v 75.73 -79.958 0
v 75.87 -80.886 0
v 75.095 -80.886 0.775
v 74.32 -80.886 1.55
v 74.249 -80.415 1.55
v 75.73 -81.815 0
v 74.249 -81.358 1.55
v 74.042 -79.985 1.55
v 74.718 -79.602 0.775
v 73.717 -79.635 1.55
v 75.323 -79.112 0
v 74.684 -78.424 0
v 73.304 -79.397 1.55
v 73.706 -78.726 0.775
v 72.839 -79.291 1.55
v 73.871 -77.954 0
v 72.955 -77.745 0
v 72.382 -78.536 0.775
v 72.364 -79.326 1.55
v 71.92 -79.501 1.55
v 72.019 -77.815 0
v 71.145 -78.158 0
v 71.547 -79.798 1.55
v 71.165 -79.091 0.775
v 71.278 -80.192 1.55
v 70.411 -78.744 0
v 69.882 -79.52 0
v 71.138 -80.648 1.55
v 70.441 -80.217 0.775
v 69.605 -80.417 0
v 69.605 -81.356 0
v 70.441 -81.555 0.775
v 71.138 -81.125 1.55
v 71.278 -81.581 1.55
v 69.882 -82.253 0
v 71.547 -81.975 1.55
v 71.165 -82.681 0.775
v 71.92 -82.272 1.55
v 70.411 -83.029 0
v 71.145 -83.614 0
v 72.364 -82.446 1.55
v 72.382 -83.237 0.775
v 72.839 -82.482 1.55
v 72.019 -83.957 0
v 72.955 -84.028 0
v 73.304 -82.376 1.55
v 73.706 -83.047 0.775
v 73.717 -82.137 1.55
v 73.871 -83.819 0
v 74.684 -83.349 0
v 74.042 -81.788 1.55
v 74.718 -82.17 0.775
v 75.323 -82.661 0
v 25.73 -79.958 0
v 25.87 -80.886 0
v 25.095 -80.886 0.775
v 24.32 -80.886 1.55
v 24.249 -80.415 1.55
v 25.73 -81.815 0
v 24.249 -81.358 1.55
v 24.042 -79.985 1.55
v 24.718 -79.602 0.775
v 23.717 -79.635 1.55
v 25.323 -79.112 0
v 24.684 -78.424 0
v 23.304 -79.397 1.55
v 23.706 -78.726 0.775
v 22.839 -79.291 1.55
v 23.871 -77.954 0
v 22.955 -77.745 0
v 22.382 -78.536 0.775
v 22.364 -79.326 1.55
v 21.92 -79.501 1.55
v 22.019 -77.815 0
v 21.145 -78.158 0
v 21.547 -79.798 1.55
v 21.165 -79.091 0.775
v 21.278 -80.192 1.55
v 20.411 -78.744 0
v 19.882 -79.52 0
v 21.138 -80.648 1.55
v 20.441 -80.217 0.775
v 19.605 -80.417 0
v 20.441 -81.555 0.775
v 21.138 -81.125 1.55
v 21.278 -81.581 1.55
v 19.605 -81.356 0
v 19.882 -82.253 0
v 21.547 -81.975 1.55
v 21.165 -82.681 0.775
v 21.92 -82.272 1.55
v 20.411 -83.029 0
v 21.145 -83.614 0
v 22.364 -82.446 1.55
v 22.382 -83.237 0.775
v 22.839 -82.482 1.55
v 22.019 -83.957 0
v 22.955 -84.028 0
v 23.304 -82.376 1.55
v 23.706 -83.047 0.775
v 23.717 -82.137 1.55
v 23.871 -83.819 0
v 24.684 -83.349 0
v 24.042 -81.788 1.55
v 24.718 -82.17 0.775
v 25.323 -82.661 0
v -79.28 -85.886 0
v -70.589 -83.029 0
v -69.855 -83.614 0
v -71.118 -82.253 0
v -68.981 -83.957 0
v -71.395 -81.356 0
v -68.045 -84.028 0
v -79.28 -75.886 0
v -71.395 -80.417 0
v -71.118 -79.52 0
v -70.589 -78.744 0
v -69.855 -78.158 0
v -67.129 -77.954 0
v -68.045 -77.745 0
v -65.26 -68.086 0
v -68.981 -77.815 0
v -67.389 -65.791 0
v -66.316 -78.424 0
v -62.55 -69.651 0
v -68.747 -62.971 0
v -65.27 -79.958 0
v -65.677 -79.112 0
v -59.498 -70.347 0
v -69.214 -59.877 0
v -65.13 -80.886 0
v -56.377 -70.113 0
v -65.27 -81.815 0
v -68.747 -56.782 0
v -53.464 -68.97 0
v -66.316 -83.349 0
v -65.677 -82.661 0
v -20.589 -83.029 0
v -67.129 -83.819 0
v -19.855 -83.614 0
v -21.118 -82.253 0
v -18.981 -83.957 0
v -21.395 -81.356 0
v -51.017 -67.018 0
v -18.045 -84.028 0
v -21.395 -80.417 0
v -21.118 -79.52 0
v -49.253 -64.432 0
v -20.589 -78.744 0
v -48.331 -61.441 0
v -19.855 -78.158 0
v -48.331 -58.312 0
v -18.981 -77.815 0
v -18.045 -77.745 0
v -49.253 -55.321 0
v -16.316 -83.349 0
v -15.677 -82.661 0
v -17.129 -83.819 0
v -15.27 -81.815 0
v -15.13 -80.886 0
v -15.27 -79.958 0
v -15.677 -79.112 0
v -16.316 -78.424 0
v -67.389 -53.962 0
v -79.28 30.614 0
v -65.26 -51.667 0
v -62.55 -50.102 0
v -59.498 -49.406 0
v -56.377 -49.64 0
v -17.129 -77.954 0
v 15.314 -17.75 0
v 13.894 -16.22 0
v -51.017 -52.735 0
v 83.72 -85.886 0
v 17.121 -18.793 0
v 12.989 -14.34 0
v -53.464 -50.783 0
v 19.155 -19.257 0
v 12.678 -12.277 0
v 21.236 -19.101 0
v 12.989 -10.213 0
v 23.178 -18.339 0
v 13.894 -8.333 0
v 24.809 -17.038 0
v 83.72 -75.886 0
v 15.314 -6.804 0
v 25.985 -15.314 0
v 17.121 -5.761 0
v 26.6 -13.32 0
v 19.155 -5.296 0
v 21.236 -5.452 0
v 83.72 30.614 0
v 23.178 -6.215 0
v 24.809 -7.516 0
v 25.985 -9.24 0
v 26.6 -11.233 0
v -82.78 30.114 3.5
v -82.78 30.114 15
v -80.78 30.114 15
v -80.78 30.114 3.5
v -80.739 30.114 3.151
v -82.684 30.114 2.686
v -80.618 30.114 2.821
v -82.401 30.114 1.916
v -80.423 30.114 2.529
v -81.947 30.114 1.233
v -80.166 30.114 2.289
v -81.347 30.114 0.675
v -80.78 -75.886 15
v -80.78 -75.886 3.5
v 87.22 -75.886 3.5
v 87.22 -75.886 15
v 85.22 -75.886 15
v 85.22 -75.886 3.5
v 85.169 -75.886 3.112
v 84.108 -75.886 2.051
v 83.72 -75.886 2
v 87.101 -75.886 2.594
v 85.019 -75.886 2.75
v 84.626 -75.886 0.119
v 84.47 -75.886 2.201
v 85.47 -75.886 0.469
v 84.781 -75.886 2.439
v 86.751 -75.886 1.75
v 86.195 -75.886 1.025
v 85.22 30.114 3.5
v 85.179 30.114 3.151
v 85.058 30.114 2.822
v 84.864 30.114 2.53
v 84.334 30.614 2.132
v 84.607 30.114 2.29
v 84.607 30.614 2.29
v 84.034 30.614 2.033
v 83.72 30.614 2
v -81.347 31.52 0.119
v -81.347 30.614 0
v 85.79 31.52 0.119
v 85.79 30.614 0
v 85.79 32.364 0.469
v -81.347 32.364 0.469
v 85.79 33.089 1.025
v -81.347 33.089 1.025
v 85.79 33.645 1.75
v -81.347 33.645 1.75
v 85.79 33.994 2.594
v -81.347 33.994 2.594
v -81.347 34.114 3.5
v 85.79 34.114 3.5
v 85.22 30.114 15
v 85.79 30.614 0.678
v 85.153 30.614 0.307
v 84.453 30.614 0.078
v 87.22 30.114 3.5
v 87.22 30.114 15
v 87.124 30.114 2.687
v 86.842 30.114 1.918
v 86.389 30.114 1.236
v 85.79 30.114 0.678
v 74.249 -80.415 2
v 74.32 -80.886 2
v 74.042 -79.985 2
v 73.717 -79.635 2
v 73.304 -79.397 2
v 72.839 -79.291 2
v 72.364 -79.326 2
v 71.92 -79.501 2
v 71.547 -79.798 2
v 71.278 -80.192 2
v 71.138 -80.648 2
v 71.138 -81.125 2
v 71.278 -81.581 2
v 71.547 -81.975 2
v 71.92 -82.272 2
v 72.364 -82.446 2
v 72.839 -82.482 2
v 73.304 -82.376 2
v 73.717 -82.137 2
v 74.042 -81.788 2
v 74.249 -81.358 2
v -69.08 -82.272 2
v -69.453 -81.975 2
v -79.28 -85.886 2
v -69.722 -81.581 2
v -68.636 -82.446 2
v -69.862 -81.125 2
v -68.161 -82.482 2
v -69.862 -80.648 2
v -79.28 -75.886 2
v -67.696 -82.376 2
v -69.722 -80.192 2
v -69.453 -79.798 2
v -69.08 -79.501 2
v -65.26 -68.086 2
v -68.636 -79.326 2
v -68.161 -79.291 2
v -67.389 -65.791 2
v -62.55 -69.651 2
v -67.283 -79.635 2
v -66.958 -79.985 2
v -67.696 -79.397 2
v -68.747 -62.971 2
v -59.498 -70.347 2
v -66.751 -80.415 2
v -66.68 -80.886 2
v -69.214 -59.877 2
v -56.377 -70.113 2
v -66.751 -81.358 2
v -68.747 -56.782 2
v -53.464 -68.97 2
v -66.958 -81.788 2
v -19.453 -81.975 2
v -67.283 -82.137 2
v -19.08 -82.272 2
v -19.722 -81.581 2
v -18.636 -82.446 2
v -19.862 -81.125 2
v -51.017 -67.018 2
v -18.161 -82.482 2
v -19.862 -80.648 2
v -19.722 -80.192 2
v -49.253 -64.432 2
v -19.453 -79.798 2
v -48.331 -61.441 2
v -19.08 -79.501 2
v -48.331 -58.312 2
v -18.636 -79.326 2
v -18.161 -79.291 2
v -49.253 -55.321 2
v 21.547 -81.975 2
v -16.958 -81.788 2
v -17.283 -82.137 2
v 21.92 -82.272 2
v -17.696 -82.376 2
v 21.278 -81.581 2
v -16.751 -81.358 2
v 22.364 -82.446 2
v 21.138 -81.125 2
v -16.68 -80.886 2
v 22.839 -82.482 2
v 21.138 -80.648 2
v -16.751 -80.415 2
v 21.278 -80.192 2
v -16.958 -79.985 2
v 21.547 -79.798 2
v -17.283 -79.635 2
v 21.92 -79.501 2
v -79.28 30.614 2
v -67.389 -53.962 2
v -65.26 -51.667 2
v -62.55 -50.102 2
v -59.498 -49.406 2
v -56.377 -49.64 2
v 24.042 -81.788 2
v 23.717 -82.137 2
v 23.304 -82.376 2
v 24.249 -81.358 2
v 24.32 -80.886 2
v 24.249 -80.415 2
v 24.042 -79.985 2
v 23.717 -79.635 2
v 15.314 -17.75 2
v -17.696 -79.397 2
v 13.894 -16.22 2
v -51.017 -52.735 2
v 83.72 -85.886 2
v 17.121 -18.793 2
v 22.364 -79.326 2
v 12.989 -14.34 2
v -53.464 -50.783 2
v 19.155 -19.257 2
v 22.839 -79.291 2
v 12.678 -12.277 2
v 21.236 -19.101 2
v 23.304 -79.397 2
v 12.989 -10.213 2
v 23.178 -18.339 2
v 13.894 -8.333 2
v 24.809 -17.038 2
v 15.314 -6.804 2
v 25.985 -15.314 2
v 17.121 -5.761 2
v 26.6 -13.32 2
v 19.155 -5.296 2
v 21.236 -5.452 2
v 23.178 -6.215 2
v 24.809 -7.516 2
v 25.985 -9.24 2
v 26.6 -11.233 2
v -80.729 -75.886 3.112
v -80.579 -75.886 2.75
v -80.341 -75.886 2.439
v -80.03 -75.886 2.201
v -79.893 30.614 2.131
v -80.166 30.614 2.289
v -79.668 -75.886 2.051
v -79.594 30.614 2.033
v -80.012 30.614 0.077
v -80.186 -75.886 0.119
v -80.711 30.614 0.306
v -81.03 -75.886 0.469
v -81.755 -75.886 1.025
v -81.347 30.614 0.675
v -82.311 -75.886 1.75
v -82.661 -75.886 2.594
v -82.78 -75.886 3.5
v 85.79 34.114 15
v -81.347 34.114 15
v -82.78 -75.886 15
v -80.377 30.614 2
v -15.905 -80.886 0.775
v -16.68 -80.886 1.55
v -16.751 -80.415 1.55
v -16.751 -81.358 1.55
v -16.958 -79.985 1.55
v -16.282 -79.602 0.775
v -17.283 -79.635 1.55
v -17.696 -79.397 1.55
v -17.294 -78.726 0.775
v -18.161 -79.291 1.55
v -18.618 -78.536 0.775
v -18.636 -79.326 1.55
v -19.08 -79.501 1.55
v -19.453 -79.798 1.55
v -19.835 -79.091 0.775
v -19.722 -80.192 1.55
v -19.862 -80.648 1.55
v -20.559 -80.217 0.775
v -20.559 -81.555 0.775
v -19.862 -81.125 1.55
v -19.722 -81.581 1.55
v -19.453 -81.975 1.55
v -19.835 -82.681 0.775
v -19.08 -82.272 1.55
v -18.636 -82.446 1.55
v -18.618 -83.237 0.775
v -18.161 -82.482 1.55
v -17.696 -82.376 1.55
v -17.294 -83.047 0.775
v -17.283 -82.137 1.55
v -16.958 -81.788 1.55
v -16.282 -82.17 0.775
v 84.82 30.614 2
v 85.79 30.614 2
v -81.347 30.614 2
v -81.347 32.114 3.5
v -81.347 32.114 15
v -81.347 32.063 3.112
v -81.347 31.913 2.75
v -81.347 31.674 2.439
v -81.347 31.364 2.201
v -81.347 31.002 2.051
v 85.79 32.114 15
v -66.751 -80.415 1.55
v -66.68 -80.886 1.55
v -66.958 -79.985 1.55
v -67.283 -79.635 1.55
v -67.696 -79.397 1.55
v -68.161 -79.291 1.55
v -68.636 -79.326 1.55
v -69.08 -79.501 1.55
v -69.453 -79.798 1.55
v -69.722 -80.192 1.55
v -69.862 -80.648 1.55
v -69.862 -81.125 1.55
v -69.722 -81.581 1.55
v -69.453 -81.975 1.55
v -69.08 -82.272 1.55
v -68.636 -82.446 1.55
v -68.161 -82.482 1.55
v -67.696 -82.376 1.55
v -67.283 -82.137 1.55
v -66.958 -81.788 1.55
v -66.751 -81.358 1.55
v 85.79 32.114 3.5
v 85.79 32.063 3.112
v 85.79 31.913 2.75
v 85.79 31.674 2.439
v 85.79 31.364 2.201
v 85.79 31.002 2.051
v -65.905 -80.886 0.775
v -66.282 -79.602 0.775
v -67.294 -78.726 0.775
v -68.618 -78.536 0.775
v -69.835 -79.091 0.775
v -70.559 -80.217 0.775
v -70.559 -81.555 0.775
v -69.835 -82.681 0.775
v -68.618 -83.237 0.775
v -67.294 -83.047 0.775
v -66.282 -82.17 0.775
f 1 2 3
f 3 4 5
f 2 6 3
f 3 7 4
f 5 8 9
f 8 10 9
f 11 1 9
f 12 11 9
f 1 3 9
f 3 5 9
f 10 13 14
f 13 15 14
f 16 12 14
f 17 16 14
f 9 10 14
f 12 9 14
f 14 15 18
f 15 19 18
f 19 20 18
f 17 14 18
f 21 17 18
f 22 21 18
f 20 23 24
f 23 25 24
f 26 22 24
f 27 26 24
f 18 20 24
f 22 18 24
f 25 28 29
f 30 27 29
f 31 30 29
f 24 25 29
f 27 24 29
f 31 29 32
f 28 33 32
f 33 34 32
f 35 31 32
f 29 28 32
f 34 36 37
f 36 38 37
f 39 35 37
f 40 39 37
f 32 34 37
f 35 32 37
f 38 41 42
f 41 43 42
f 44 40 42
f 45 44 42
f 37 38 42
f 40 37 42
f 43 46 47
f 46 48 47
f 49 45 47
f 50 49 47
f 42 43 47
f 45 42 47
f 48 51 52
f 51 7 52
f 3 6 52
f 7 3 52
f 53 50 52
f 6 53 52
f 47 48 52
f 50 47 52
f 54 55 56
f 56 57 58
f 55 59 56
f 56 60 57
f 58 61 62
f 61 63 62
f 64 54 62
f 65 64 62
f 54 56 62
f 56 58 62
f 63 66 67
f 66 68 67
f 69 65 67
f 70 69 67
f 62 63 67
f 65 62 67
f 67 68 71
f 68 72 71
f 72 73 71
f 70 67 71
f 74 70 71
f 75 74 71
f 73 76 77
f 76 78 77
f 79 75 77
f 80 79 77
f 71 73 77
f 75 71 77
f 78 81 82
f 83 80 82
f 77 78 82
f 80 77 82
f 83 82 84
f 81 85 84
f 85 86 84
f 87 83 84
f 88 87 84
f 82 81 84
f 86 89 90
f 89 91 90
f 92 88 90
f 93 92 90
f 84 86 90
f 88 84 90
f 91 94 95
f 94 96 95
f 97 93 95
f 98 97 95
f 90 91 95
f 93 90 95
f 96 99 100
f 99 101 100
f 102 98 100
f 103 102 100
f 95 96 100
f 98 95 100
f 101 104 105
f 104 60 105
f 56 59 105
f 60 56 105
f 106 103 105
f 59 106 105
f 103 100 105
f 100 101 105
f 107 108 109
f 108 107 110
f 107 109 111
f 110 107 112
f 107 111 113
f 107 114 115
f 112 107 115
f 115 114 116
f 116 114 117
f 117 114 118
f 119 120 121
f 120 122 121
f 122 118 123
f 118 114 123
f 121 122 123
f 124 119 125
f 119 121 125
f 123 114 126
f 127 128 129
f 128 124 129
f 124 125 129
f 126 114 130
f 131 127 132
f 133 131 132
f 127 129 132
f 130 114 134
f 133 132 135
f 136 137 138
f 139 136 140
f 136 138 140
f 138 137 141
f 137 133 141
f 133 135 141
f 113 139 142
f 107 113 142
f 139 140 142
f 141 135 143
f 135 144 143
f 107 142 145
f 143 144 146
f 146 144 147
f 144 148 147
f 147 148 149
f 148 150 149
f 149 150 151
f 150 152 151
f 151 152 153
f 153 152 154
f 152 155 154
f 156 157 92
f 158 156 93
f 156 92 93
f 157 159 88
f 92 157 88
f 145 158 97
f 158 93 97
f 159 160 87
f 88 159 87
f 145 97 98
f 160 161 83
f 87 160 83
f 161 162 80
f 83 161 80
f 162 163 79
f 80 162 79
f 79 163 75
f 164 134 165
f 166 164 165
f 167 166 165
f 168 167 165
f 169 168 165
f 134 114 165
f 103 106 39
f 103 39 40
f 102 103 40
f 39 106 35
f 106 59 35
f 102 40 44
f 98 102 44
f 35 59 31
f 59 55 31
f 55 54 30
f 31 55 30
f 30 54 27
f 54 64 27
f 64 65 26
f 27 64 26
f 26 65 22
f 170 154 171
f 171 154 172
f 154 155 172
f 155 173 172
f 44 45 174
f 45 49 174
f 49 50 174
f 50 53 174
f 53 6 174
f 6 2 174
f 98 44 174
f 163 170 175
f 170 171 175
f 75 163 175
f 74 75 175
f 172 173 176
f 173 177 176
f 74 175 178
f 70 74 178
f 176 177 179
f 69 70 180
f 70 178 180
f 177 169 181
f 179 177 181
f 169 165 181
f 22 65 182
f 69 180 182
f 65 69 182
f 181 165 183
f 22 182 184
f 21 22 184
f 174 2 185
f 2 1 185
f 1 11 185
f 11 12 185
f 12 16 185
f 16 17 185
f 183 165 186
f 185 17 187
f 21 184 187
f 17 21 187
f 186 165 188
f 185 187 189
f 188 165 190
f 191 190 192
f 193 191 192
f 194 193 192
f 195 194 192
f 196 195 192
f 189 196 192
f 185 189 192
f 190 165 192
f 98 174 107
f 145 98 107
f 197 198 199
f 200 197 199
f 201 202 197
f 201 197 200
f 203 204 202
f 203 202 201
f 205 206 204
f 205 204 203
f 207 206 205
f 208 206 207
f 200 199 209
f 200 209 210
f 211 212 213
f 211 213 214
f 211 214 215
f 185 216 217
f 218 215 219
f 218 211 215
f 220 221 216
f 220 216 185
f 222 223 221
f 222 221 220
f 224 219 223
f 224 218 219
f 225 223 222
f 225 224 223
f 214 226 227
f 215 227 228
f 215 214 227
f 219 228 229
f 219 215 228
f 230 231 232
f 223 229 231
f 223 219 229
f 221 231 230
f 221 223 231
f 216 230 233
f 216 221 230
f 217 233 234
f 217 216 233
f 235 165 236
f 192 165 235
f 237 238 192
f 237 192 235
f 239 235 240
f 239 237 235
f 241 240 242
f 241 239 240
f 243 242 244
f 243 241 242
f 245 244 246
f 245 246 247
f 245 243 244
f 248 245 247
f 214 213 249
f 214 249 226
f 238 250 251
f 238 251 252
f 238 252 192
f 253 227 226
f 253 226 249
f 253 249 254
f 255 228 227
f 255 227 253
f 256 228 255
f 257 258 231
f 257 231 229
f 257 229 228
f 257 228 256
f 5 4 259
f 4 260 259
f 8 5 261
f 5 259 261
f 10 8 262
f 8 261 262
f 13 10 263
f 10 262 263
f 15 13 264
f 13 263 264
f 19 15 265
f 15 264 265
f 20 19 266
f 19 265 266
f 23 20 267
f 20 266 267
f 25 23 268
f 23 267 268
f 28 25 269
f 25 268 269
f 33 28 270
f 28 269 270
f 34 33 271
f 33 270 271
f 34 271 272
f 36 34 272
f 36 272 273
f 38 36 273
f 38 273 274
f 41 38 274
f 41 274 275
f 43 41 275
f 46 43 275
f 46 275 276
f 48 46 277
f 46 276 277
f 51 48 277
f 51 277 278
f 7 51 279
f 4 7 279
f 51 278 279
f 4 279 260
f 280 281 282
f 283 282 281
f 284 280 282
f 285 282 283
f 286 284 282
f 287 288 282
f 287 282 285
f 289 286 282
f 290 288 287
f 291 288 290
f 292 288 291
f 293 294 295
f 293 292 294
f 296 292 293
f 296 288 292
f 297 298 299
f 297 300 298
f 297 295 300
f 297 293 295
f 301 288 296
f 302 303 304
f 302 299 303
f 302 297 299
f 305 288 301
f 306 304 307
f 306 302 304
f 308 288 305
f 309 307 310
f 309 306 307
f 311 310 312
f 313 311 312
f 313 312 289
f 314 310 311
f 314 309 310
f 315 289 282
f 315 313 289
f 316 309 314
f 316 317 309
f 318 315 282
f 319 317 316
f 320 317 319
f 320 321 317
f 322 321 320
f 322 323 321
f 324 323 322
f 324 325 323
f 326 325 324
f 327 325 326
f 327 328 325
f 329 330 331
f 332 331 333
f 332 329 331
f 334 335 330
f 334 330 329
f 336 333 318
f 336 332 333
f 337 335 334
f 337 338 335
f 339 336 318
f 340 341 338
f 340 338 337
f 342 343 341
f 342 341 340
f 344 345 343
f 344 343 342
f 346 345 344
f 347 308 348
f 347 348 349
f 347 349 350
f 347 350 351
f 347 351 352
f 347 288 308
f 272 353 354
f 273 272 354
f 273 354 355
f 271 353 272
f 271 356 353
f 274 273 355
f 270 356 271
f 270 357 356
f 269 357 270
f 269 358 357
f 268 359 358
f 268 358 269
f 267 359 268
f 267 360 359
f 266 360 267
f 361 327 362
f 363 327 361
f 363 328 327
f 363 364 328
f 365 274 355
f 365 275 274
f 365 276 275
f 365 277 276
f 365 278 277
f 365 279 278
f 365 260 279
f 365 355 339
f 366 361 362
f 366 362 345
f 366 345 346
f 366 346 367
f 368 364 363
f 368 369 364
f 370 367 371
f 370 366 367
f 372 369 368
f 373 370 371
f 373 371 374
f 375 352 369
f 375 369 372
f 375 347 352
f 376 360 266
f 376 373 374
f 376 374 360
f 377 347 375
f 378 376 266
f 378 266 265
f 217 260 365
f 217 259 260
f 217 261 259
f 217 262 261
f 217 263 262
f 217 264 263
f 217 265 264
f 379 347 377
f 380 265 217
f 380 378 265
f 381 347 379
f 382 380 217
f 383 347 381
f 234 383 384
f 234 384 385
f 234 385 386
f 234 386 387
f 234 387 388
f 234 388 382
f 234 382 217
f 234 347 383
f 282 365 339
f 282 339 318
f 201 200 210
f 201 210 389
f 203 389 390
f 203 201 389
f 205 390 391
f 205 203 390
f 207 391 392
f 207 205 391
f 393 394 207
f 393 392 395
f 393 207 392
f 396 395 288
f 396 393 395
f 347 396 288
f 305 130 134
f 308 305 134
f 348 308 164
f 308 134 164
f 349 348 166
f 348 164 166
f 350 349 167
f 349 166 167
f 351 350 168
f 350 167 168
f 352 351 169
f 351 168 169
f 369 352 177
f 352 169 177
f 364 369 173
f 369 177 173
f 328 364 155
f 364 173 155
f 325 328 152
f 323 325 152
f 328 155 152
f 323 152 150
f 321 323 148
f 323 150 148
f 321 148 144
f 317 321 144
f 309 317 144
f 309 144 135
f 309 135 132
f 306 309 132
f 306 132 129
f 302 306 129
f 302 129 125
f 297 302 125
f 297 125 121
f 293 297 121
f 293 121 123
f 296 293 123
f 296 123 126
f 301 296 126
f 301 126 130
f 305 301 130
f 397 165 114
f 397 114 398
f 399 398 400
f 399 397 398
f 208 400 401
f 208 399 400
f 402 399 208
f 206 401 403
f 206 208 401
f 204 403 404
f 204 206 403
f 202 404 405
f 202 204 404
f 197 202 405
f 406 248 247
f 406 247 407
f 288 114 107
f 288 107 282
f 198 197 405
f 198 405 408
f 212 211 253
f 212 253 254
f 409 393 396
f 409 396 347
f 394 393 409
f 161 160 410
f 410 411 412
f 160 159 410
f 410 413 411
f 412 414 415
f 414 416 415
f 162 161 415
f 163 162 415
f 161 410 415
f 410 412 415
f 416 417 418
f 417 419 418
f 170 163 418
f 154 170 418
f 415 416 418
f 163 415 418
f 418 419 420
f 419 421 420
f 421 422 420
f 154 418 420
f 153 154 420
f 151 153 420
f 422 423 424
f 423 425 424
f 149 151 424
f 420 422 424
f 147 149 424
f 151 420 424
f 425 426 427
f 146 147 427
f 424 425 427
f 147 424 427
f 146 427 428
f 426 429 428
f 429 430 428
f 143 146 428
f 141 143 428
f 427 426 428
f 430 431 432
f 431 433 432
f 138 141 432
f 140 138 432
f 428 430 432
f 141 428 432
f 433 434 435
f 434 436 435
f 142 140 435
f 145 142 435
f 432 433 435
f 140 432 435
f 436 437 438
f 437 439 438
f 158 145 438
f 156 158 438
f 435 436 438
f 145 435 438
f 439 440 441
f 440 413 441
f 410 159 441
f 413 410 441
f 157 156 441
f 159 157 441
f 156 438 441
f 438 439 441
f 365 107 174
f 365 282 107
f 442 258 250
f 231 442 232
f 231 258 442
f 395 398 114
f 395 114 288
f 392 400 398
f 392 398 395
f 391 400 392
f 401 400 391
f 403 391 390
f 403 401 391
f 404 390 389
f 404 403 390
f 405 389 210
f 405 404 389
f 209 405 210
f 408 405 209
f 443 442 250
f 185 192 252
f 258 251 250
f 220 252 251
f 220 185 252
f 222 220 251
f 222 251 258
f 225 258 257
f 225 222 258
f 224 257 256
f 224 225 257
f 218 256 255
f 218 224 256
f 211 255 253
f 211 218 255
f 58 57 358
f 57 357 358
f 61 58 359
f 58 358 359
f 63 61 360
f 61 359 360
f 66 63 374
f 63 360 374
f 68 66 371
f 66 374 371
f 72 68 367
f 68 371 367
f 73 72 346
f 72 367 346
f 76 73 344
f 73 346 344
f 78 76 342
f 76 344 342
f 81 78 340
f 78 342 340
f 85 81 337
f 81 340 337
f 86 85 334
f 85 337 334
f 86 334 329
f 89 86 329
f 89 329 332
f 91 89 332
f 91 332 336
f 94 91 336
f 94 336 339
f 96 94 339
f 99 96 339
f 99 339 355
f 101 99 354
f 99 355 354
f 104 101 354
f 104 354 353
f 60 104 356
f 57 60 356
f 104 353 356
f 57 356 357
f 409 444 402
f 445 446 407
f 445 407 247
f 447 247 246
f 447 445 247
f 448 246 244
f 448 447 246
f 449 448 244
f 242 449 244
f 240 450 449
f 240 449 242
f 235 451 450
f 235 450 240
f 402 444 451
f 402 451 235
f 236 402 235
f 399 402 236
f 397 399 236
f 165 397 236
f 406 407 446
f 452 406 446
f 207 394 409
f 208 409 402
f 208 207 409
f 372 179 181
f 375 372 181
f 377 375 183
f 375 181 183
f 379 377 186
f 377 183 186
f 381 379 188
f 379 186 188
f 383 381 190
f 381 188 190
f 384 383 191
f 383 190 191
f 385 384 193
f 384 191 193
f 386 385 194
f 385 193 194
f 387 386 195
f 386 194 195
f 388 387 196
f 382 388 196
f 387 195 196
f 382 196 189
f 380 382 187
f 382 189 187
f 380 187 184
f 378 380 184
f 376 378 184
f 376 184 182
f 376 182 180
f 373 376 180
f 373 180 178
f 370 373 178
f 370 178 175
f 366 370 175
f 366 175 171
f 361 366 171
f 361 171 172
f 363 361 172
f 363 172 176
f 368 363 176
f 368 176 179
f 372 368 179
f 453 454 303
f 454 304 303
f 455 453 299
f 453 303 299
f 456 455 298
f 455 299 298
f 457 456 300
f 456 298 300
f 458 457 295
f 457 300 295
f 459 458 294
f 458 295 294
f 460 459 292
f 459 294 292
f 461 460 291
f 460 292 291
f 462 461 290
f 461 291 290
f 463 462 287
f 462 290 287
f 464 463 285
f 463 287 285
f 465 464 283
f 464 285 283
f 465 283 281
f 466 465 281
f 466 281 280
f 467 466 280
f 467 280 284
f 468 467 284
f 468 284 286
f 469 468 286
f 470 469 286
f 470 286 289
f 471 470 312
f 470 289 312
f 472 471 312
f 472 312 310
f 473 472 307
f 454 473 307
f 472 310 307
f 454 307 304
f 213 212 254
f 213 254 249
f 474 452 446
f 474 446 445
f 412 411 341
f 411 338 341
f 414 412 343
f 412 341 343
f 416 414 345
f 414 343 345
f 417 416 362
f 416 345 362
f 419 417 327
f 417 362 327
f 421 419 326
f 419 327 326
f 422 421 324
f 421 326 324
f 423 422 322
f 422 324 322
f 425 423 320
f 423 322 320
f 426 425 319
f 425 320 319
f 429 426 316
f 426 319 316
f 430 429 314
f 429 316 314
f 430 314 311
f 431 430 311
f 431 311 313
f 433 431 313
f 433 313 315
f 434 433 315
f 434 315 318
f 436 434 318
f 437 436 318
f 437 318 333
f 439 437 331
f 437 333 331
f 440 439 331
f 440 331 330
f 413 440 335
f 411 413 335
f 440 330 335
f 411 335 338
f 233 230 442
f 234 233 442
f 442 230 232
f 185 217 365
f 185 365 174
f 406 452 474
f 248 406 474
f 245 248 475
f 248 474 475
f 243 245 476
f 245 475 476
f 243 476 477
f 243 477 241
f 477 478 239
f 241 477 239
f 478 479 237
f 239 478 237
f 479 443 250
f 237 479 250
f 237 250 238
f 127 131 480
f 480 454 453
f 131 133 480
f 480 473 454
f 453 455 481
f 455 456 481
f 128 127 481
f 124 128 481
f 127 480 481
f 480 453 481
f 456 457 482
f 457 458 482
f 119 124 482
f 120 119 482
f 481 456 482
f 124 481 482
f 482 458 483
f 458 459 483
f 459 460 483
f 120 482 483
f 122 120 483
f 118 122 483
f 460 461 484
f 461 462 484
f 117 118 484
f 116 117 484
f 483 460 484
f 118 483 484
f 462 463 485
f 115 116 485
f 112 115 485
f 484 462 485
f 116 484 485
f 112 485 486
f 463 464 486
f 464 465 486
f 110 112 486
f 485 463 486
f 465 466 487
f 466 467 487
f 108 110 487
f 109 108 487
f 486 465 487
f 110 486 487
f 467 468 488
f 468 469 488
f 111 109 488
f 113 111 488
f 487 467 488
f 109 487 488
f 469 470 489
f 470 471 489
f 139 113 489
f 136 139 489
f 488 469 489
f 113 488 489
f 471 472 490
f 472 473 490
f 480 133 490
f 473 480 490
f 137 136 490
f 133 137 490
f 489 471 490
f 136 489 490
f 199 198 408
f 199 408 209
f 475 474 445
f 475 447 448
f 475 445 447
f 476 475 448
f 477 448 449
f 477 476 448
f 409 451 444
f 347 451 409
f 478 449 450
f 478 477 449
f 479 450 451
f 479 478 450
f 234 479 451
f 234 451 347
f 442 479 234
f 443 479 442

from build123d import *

# Parameters (mm, degrees)
SKETCH1_W                                       = 170
SKETCH1_H                                       = 118
BOSS_EXTRUDE1_DEPTH                             = 2
EDGE_FLANGE4_STRIP_W                            = 11
EDGE_FLANGE4_STRIP_H                            = 2
EDGE_FLANGE4_STRIP_CUT_DEPTH                    = 170
EDGE_FLANGE4_DEPTH                              = 170
EDGE_FLANGE5_STRIP_W                            = 11
EDGE_FLANGE5_STRIP_H                            = 2
EDGE_FLANGE5_STRIP_CUT_DEPTH                    = 116.5
EDGE_FLANGE5_DEPTH                              = 116.5
EDGE_FLANGE6_STRIP_W                            = 11
EDGE_FLANGE6_STRIP_H                            = 2
EDGE_FLANGE6_STRIP_CUT_DEPTH                    = 116.5
EDGE_FLANGE6_DEPTH                              = 116.5
SKETCH26_W                                      = 18.240462441
SKETCH26_H                                      = 10
CUT_EXTRUDE2_DEPTH                              = 3.5
SKETCH27_W                                      = 23.960032842
SKETCH27_H                                      = 10
CUT_EXTRUDE3_DEPTH                              = 3.5
CSK_FOR_M3_FLAT_HEAD_MACHINE_SCREW2_D           = 3.2
CSK_FOR_M3_FLAT_HEAD_MACHINE_SCREW2_CSINK_D     = 6.3
CSK_FOR_M3_FLAT_HEAD_MACHINE_SCREW2_CSINK_ANGLE = 90
CUT_EXTRUDE4_REACH                              = 125.324
SKETCH32_R                                      = 7
CUT_EXTRUDE5_REACH                              = 125.324
SKETCH33_R                                      = 10.5
CUT_EXTRUDE6_START                              = -4
CUT_EXTRUDE6_OUTLINE_W                          = 1.43
CUT_EXTRUDE6_OUTLINE_H                          = 18
CUT_EXTRUDE6_OUTLINE_W_2                        = 1.43354479
CUT_EXTRUDE6_DEPTH                              = 4
CUT_EXTRUDE6_2_DEPTH                            = 0.5


# Read off the part's stored shape, not the designer's step: Cut-Extrude6
# Sheet-metal steps are written as plain solids
with BuildPart() as part:
    # Sketch1 → Boss-Extrude1 (new body)
    with BuildSketch(Plane.XY):
        with Locations((2.219863014, -26.886363636)):
            Rectangle(SKETCH1_W, SKETCH1_H)
    extrude(amount=BOSS_EXTRUDE1_DEPTH)

    # Edge-Flange4 strip (across the edge) → Edge-Flange4 strip cut (cut)
    with BuildSketch(Plane(origin=(87.219863014, 32.113636364, 2), x_dir=(0, -1, 0), z_dir=(-1, 0, 0))):
        with Locations((-4, -1)):
            Rectangle(EDGE_FLANGE4_STRIP_W, EDGE_FLANGE4_STRIP_H)
    extrude(amount=EDGE_FLANGE4_STRIP_CUT_DEPTH, mode=Mode.SUBTRACT)

    # Edge-Flange4 section (across the edge) → Edge-Flange4 (add)
    with BuildSketch(Plane(origin=(87.219863014, 32.113636364, 2), x_dir=(0, -1, 0), z_dir=(-1, 0, 0))):
        with BuildLine():
            Line((-2, 1.5), (-2, 13))
            Line((-2, 13), (0, 13))
            Line((0, 13), (0, 1.5))
            ThreePointArc((0, 1.5), (0.439339828, 0.439339828), (1.5, 0))
            Line((1.5, 0), (1.5, -2))
            ThreePointArc((1.5, -2), (-0.974873734, -0.974873734), (-2, 1.5))
        make_face()
    extrude(amount=EDGE_FLANGE4_DEPTH)

    # Edge-Flange5 strip (across the edge) → Edge-Flange5 strip cut (cut)
    with BuildSketch(Plane(origin=(-82.780136986, 30.613636364, 2), x_dir=(1, 0, 0), z_dir=(0, -1, 0))):
        with Locations((-2, -1)):
            Rectangle(EDGE_FLANGE5_STRIP_W, EDGE_FLANGE5_STRIP_H)
    extrude(amount=EDGE_FLANGE5_STRIP_CUT_DEPTH, mode=Mode.SUBTRACT)

    # Edge-Flange5 section (across the edge) → Edge-Flange5 (add)
    with BuildSketch(Plane(origin=(-82.780136986, 30.613636364, 2), x_dir=(1, 0, 0), z_dir=(0, -1, 0))):
        with BuildLine():
            Line((0, 1.5), (0, 13))
            Line((0, 13), (2, 13))
            Line((2, 13), (2, 1.5))
            ThreePointArc((2, 1.5), (2.439339828, 0.439339828), (3.5, 0))
            Line((3.5, 0), (3.5, -2))
            ThreePointArc((3.5, -2), (1.025126266, -0.974873734), (0, 1.5))
        make_face()
    extrude(amount=EDGE_FLANGE5_DEPTH)

    # Edge-Flange6 strip (across the edge) → Edge-Flange6 strip cut (cut)
    with BuildSketch(Plane(origin=(87.219863014, -85.886363636, 2), x_dir=(-1, 0, 0), z_dir=(0, 1, 0))):
        with Locations((-2, -1)):
            Rectangle(EDGE_FLANGE6_STRIP_W, EDGE_FLANGE6_STRIP_H)
    extrude(amount=EDGE_FLANGE6_STRIP_CUT_DEPTH, mode=Mode.SUBTRACT)

    # Edge-Flange6 section (across the edge) → Edge-Flange6 (add)
    with BuildSketch(Plane(origin=(87.219863014, -85.886363636, 2), x_dir=(-1, 0, 0), z_dir=(0, 1, 0))):
        with BuildLine():
            Line((0, 1.5), (0, 13))
            Line((0, 13), (2, 13))
            Line((2, 13), (2, 1.5))
            ThreePointArc((2, 1.5), (2.439339828, 0.439339828), (3.5, 0))
            Line((3.5, 0), (3.5, -2))
            ThreePointArc((3.5, -2), (1.025126266, -0.974873734), (0, 1.5))
        make_face()
    extrude(amount=EDGE_FLANGE6_DEPTH)

    # Sketch26 → Cut-Extrude2 (cut)
    with BuildSketch(Plane.ZY.offset(82.780136986)):
        with Locations((5.87976878, -80.886363636)):
            Rectangle(SKETCH26_W, SKETCH26_H)
    extrude(amount=-CUT_EXTRUDE2_DEPTH, mode=Mode.SUBTRACT)

    # Sketch27 → Cut-Extrude3 (cut)
    with BuildSketch(Plane(origin=(87.219863014, 0, 0), x_dir=(0, 0, -1), z_dir=(1, 0, 0))):
        with Locations((-3.019983579, -80.886363636)):
            Rectangle(SKETCH27_W, SKETCH27_H)
    extrude(amount=-CUT_EXTRUDE3_DEPTH, mode=Mode.SUBTRACT)

    # CSK for M3 Flat Head Machine Screw2 (through all)
    with Locations(Plane(origin=(0, 0, 0), x_dir=(-1, 0, 0), z_dir=(0, 0, -1))):
        with Locations((-72.719863014, -80.886363636), (-22.719863014, -80.886363636), (18.280136986, -80.886363636), (68.280136986, -80.886363636)):
            CounterSinkHole(CSK_FOR_M3_FLAT_HEAD_MACHINE_SCREW2_D / 2, CSK_FOR_M3_FLAT_HEAD_MACHINE_SCREW2_CSINK_D / 2, counter_sink_angle=CSK_FOR_M3_FLAT_HEAD_MACHINE_SCREW2_CSINK_ANGLE)

    # Sketch32 → Cut-Extrude4 (cut, up to next)
    with BuildSketch(Plane(origin=(0, 0, 0), x_dir=(-1, 0, 0), z_dir=(0, 0, -1)), mode=Mode.PRIVATE) as cut_extrude4_sk1:
        with Locations((-19.678120583, -12.276718373)):
            Circle(SKETCH32_R)
    cut_extrude4_tool1 = extrude(cut_extrude4_sk1.sketch, amount=-CUT_EXTRUDE4_REACH, mode=Mode.PRIVATE) & part.part
    add(cut_extrude4_tool1.solids().sort_by_distance((19.678121, -12.276718, 0))[0], mode=Mode.SUBTRACT)

    # Sketch33 → Cut-Extrude5 (cut, up to next)
    with BuildSketch(Plane(origin=(0, 0, 0), x_dir=(-1, 0, 0), z_dir=(0, 0, -1)), mode=Mode.PRIVATE) as cut_extrude5_sk1:
        with Locations((58.713568672, -59.876553933)):
            Circle(SKETCH33_R)
    cut_extrude5_tool1 = extrude(cut_extrude5_sk1.sketch, amount=-CUT_EXTRUDE5_REACH, mode=Mode.PRIVATE) & part.part
    add(cut_extrude5_tool1.solids().sort_by_distance((-58.713569, -59.876554, 0))[0], mode=Mode.SUBTRACT)

    # Cut-Extrude6 outline → Cut-Extrude6 (cut)
    with BuildSketch(Plane(origin=(0, 34.113636364, 0), x_dir=(1, 0, 0), z_dir=(0, 1, 0)).offset(CUT_EXTRUDE6_START)):
        with Locations((86.504863014, -8)):
            Rectangle(CUT_EXTRUDE6_OUTLINE_W, CUT_EXTRUDE6_OUTLINE_H)
        with Locations((-82.063364591, -8)):
            Rectangle(CUT_EXTRUDE6_OUTLINE_W_2, CUT_EXTRUDE6_OUTLINE_H)
    extrude(amount=CUT_EXTRUDE6_DEPTH, mode=Mode.SUBTRACT)

    # Cut-Extrude6 2 outline → Cut-Extrude6 2 (cut)
    with BuildSketch(Plane(origin=(0, 34.113636364, 0), x_dir=(1, 0, 0), z_dir=(0, 1, 0)).offset(CUT_EXTRUDE6_START)):
        Polygon((85.789863014, -17), (85.789863014, -0.677749125), (84.607005871, -2.290463911), (73.818191888, -17), align=None)
        Polygon((-81.346592196, -17), (-69.404507856, -17), (-80.165760648, -2.289351112), (-81.346592196, -0.675152595), align=None)
    extrude(amount=CUT_EXTRUDE6_2_DEPTH, mode=Mode.SUBTRACT)


solid = part.part
